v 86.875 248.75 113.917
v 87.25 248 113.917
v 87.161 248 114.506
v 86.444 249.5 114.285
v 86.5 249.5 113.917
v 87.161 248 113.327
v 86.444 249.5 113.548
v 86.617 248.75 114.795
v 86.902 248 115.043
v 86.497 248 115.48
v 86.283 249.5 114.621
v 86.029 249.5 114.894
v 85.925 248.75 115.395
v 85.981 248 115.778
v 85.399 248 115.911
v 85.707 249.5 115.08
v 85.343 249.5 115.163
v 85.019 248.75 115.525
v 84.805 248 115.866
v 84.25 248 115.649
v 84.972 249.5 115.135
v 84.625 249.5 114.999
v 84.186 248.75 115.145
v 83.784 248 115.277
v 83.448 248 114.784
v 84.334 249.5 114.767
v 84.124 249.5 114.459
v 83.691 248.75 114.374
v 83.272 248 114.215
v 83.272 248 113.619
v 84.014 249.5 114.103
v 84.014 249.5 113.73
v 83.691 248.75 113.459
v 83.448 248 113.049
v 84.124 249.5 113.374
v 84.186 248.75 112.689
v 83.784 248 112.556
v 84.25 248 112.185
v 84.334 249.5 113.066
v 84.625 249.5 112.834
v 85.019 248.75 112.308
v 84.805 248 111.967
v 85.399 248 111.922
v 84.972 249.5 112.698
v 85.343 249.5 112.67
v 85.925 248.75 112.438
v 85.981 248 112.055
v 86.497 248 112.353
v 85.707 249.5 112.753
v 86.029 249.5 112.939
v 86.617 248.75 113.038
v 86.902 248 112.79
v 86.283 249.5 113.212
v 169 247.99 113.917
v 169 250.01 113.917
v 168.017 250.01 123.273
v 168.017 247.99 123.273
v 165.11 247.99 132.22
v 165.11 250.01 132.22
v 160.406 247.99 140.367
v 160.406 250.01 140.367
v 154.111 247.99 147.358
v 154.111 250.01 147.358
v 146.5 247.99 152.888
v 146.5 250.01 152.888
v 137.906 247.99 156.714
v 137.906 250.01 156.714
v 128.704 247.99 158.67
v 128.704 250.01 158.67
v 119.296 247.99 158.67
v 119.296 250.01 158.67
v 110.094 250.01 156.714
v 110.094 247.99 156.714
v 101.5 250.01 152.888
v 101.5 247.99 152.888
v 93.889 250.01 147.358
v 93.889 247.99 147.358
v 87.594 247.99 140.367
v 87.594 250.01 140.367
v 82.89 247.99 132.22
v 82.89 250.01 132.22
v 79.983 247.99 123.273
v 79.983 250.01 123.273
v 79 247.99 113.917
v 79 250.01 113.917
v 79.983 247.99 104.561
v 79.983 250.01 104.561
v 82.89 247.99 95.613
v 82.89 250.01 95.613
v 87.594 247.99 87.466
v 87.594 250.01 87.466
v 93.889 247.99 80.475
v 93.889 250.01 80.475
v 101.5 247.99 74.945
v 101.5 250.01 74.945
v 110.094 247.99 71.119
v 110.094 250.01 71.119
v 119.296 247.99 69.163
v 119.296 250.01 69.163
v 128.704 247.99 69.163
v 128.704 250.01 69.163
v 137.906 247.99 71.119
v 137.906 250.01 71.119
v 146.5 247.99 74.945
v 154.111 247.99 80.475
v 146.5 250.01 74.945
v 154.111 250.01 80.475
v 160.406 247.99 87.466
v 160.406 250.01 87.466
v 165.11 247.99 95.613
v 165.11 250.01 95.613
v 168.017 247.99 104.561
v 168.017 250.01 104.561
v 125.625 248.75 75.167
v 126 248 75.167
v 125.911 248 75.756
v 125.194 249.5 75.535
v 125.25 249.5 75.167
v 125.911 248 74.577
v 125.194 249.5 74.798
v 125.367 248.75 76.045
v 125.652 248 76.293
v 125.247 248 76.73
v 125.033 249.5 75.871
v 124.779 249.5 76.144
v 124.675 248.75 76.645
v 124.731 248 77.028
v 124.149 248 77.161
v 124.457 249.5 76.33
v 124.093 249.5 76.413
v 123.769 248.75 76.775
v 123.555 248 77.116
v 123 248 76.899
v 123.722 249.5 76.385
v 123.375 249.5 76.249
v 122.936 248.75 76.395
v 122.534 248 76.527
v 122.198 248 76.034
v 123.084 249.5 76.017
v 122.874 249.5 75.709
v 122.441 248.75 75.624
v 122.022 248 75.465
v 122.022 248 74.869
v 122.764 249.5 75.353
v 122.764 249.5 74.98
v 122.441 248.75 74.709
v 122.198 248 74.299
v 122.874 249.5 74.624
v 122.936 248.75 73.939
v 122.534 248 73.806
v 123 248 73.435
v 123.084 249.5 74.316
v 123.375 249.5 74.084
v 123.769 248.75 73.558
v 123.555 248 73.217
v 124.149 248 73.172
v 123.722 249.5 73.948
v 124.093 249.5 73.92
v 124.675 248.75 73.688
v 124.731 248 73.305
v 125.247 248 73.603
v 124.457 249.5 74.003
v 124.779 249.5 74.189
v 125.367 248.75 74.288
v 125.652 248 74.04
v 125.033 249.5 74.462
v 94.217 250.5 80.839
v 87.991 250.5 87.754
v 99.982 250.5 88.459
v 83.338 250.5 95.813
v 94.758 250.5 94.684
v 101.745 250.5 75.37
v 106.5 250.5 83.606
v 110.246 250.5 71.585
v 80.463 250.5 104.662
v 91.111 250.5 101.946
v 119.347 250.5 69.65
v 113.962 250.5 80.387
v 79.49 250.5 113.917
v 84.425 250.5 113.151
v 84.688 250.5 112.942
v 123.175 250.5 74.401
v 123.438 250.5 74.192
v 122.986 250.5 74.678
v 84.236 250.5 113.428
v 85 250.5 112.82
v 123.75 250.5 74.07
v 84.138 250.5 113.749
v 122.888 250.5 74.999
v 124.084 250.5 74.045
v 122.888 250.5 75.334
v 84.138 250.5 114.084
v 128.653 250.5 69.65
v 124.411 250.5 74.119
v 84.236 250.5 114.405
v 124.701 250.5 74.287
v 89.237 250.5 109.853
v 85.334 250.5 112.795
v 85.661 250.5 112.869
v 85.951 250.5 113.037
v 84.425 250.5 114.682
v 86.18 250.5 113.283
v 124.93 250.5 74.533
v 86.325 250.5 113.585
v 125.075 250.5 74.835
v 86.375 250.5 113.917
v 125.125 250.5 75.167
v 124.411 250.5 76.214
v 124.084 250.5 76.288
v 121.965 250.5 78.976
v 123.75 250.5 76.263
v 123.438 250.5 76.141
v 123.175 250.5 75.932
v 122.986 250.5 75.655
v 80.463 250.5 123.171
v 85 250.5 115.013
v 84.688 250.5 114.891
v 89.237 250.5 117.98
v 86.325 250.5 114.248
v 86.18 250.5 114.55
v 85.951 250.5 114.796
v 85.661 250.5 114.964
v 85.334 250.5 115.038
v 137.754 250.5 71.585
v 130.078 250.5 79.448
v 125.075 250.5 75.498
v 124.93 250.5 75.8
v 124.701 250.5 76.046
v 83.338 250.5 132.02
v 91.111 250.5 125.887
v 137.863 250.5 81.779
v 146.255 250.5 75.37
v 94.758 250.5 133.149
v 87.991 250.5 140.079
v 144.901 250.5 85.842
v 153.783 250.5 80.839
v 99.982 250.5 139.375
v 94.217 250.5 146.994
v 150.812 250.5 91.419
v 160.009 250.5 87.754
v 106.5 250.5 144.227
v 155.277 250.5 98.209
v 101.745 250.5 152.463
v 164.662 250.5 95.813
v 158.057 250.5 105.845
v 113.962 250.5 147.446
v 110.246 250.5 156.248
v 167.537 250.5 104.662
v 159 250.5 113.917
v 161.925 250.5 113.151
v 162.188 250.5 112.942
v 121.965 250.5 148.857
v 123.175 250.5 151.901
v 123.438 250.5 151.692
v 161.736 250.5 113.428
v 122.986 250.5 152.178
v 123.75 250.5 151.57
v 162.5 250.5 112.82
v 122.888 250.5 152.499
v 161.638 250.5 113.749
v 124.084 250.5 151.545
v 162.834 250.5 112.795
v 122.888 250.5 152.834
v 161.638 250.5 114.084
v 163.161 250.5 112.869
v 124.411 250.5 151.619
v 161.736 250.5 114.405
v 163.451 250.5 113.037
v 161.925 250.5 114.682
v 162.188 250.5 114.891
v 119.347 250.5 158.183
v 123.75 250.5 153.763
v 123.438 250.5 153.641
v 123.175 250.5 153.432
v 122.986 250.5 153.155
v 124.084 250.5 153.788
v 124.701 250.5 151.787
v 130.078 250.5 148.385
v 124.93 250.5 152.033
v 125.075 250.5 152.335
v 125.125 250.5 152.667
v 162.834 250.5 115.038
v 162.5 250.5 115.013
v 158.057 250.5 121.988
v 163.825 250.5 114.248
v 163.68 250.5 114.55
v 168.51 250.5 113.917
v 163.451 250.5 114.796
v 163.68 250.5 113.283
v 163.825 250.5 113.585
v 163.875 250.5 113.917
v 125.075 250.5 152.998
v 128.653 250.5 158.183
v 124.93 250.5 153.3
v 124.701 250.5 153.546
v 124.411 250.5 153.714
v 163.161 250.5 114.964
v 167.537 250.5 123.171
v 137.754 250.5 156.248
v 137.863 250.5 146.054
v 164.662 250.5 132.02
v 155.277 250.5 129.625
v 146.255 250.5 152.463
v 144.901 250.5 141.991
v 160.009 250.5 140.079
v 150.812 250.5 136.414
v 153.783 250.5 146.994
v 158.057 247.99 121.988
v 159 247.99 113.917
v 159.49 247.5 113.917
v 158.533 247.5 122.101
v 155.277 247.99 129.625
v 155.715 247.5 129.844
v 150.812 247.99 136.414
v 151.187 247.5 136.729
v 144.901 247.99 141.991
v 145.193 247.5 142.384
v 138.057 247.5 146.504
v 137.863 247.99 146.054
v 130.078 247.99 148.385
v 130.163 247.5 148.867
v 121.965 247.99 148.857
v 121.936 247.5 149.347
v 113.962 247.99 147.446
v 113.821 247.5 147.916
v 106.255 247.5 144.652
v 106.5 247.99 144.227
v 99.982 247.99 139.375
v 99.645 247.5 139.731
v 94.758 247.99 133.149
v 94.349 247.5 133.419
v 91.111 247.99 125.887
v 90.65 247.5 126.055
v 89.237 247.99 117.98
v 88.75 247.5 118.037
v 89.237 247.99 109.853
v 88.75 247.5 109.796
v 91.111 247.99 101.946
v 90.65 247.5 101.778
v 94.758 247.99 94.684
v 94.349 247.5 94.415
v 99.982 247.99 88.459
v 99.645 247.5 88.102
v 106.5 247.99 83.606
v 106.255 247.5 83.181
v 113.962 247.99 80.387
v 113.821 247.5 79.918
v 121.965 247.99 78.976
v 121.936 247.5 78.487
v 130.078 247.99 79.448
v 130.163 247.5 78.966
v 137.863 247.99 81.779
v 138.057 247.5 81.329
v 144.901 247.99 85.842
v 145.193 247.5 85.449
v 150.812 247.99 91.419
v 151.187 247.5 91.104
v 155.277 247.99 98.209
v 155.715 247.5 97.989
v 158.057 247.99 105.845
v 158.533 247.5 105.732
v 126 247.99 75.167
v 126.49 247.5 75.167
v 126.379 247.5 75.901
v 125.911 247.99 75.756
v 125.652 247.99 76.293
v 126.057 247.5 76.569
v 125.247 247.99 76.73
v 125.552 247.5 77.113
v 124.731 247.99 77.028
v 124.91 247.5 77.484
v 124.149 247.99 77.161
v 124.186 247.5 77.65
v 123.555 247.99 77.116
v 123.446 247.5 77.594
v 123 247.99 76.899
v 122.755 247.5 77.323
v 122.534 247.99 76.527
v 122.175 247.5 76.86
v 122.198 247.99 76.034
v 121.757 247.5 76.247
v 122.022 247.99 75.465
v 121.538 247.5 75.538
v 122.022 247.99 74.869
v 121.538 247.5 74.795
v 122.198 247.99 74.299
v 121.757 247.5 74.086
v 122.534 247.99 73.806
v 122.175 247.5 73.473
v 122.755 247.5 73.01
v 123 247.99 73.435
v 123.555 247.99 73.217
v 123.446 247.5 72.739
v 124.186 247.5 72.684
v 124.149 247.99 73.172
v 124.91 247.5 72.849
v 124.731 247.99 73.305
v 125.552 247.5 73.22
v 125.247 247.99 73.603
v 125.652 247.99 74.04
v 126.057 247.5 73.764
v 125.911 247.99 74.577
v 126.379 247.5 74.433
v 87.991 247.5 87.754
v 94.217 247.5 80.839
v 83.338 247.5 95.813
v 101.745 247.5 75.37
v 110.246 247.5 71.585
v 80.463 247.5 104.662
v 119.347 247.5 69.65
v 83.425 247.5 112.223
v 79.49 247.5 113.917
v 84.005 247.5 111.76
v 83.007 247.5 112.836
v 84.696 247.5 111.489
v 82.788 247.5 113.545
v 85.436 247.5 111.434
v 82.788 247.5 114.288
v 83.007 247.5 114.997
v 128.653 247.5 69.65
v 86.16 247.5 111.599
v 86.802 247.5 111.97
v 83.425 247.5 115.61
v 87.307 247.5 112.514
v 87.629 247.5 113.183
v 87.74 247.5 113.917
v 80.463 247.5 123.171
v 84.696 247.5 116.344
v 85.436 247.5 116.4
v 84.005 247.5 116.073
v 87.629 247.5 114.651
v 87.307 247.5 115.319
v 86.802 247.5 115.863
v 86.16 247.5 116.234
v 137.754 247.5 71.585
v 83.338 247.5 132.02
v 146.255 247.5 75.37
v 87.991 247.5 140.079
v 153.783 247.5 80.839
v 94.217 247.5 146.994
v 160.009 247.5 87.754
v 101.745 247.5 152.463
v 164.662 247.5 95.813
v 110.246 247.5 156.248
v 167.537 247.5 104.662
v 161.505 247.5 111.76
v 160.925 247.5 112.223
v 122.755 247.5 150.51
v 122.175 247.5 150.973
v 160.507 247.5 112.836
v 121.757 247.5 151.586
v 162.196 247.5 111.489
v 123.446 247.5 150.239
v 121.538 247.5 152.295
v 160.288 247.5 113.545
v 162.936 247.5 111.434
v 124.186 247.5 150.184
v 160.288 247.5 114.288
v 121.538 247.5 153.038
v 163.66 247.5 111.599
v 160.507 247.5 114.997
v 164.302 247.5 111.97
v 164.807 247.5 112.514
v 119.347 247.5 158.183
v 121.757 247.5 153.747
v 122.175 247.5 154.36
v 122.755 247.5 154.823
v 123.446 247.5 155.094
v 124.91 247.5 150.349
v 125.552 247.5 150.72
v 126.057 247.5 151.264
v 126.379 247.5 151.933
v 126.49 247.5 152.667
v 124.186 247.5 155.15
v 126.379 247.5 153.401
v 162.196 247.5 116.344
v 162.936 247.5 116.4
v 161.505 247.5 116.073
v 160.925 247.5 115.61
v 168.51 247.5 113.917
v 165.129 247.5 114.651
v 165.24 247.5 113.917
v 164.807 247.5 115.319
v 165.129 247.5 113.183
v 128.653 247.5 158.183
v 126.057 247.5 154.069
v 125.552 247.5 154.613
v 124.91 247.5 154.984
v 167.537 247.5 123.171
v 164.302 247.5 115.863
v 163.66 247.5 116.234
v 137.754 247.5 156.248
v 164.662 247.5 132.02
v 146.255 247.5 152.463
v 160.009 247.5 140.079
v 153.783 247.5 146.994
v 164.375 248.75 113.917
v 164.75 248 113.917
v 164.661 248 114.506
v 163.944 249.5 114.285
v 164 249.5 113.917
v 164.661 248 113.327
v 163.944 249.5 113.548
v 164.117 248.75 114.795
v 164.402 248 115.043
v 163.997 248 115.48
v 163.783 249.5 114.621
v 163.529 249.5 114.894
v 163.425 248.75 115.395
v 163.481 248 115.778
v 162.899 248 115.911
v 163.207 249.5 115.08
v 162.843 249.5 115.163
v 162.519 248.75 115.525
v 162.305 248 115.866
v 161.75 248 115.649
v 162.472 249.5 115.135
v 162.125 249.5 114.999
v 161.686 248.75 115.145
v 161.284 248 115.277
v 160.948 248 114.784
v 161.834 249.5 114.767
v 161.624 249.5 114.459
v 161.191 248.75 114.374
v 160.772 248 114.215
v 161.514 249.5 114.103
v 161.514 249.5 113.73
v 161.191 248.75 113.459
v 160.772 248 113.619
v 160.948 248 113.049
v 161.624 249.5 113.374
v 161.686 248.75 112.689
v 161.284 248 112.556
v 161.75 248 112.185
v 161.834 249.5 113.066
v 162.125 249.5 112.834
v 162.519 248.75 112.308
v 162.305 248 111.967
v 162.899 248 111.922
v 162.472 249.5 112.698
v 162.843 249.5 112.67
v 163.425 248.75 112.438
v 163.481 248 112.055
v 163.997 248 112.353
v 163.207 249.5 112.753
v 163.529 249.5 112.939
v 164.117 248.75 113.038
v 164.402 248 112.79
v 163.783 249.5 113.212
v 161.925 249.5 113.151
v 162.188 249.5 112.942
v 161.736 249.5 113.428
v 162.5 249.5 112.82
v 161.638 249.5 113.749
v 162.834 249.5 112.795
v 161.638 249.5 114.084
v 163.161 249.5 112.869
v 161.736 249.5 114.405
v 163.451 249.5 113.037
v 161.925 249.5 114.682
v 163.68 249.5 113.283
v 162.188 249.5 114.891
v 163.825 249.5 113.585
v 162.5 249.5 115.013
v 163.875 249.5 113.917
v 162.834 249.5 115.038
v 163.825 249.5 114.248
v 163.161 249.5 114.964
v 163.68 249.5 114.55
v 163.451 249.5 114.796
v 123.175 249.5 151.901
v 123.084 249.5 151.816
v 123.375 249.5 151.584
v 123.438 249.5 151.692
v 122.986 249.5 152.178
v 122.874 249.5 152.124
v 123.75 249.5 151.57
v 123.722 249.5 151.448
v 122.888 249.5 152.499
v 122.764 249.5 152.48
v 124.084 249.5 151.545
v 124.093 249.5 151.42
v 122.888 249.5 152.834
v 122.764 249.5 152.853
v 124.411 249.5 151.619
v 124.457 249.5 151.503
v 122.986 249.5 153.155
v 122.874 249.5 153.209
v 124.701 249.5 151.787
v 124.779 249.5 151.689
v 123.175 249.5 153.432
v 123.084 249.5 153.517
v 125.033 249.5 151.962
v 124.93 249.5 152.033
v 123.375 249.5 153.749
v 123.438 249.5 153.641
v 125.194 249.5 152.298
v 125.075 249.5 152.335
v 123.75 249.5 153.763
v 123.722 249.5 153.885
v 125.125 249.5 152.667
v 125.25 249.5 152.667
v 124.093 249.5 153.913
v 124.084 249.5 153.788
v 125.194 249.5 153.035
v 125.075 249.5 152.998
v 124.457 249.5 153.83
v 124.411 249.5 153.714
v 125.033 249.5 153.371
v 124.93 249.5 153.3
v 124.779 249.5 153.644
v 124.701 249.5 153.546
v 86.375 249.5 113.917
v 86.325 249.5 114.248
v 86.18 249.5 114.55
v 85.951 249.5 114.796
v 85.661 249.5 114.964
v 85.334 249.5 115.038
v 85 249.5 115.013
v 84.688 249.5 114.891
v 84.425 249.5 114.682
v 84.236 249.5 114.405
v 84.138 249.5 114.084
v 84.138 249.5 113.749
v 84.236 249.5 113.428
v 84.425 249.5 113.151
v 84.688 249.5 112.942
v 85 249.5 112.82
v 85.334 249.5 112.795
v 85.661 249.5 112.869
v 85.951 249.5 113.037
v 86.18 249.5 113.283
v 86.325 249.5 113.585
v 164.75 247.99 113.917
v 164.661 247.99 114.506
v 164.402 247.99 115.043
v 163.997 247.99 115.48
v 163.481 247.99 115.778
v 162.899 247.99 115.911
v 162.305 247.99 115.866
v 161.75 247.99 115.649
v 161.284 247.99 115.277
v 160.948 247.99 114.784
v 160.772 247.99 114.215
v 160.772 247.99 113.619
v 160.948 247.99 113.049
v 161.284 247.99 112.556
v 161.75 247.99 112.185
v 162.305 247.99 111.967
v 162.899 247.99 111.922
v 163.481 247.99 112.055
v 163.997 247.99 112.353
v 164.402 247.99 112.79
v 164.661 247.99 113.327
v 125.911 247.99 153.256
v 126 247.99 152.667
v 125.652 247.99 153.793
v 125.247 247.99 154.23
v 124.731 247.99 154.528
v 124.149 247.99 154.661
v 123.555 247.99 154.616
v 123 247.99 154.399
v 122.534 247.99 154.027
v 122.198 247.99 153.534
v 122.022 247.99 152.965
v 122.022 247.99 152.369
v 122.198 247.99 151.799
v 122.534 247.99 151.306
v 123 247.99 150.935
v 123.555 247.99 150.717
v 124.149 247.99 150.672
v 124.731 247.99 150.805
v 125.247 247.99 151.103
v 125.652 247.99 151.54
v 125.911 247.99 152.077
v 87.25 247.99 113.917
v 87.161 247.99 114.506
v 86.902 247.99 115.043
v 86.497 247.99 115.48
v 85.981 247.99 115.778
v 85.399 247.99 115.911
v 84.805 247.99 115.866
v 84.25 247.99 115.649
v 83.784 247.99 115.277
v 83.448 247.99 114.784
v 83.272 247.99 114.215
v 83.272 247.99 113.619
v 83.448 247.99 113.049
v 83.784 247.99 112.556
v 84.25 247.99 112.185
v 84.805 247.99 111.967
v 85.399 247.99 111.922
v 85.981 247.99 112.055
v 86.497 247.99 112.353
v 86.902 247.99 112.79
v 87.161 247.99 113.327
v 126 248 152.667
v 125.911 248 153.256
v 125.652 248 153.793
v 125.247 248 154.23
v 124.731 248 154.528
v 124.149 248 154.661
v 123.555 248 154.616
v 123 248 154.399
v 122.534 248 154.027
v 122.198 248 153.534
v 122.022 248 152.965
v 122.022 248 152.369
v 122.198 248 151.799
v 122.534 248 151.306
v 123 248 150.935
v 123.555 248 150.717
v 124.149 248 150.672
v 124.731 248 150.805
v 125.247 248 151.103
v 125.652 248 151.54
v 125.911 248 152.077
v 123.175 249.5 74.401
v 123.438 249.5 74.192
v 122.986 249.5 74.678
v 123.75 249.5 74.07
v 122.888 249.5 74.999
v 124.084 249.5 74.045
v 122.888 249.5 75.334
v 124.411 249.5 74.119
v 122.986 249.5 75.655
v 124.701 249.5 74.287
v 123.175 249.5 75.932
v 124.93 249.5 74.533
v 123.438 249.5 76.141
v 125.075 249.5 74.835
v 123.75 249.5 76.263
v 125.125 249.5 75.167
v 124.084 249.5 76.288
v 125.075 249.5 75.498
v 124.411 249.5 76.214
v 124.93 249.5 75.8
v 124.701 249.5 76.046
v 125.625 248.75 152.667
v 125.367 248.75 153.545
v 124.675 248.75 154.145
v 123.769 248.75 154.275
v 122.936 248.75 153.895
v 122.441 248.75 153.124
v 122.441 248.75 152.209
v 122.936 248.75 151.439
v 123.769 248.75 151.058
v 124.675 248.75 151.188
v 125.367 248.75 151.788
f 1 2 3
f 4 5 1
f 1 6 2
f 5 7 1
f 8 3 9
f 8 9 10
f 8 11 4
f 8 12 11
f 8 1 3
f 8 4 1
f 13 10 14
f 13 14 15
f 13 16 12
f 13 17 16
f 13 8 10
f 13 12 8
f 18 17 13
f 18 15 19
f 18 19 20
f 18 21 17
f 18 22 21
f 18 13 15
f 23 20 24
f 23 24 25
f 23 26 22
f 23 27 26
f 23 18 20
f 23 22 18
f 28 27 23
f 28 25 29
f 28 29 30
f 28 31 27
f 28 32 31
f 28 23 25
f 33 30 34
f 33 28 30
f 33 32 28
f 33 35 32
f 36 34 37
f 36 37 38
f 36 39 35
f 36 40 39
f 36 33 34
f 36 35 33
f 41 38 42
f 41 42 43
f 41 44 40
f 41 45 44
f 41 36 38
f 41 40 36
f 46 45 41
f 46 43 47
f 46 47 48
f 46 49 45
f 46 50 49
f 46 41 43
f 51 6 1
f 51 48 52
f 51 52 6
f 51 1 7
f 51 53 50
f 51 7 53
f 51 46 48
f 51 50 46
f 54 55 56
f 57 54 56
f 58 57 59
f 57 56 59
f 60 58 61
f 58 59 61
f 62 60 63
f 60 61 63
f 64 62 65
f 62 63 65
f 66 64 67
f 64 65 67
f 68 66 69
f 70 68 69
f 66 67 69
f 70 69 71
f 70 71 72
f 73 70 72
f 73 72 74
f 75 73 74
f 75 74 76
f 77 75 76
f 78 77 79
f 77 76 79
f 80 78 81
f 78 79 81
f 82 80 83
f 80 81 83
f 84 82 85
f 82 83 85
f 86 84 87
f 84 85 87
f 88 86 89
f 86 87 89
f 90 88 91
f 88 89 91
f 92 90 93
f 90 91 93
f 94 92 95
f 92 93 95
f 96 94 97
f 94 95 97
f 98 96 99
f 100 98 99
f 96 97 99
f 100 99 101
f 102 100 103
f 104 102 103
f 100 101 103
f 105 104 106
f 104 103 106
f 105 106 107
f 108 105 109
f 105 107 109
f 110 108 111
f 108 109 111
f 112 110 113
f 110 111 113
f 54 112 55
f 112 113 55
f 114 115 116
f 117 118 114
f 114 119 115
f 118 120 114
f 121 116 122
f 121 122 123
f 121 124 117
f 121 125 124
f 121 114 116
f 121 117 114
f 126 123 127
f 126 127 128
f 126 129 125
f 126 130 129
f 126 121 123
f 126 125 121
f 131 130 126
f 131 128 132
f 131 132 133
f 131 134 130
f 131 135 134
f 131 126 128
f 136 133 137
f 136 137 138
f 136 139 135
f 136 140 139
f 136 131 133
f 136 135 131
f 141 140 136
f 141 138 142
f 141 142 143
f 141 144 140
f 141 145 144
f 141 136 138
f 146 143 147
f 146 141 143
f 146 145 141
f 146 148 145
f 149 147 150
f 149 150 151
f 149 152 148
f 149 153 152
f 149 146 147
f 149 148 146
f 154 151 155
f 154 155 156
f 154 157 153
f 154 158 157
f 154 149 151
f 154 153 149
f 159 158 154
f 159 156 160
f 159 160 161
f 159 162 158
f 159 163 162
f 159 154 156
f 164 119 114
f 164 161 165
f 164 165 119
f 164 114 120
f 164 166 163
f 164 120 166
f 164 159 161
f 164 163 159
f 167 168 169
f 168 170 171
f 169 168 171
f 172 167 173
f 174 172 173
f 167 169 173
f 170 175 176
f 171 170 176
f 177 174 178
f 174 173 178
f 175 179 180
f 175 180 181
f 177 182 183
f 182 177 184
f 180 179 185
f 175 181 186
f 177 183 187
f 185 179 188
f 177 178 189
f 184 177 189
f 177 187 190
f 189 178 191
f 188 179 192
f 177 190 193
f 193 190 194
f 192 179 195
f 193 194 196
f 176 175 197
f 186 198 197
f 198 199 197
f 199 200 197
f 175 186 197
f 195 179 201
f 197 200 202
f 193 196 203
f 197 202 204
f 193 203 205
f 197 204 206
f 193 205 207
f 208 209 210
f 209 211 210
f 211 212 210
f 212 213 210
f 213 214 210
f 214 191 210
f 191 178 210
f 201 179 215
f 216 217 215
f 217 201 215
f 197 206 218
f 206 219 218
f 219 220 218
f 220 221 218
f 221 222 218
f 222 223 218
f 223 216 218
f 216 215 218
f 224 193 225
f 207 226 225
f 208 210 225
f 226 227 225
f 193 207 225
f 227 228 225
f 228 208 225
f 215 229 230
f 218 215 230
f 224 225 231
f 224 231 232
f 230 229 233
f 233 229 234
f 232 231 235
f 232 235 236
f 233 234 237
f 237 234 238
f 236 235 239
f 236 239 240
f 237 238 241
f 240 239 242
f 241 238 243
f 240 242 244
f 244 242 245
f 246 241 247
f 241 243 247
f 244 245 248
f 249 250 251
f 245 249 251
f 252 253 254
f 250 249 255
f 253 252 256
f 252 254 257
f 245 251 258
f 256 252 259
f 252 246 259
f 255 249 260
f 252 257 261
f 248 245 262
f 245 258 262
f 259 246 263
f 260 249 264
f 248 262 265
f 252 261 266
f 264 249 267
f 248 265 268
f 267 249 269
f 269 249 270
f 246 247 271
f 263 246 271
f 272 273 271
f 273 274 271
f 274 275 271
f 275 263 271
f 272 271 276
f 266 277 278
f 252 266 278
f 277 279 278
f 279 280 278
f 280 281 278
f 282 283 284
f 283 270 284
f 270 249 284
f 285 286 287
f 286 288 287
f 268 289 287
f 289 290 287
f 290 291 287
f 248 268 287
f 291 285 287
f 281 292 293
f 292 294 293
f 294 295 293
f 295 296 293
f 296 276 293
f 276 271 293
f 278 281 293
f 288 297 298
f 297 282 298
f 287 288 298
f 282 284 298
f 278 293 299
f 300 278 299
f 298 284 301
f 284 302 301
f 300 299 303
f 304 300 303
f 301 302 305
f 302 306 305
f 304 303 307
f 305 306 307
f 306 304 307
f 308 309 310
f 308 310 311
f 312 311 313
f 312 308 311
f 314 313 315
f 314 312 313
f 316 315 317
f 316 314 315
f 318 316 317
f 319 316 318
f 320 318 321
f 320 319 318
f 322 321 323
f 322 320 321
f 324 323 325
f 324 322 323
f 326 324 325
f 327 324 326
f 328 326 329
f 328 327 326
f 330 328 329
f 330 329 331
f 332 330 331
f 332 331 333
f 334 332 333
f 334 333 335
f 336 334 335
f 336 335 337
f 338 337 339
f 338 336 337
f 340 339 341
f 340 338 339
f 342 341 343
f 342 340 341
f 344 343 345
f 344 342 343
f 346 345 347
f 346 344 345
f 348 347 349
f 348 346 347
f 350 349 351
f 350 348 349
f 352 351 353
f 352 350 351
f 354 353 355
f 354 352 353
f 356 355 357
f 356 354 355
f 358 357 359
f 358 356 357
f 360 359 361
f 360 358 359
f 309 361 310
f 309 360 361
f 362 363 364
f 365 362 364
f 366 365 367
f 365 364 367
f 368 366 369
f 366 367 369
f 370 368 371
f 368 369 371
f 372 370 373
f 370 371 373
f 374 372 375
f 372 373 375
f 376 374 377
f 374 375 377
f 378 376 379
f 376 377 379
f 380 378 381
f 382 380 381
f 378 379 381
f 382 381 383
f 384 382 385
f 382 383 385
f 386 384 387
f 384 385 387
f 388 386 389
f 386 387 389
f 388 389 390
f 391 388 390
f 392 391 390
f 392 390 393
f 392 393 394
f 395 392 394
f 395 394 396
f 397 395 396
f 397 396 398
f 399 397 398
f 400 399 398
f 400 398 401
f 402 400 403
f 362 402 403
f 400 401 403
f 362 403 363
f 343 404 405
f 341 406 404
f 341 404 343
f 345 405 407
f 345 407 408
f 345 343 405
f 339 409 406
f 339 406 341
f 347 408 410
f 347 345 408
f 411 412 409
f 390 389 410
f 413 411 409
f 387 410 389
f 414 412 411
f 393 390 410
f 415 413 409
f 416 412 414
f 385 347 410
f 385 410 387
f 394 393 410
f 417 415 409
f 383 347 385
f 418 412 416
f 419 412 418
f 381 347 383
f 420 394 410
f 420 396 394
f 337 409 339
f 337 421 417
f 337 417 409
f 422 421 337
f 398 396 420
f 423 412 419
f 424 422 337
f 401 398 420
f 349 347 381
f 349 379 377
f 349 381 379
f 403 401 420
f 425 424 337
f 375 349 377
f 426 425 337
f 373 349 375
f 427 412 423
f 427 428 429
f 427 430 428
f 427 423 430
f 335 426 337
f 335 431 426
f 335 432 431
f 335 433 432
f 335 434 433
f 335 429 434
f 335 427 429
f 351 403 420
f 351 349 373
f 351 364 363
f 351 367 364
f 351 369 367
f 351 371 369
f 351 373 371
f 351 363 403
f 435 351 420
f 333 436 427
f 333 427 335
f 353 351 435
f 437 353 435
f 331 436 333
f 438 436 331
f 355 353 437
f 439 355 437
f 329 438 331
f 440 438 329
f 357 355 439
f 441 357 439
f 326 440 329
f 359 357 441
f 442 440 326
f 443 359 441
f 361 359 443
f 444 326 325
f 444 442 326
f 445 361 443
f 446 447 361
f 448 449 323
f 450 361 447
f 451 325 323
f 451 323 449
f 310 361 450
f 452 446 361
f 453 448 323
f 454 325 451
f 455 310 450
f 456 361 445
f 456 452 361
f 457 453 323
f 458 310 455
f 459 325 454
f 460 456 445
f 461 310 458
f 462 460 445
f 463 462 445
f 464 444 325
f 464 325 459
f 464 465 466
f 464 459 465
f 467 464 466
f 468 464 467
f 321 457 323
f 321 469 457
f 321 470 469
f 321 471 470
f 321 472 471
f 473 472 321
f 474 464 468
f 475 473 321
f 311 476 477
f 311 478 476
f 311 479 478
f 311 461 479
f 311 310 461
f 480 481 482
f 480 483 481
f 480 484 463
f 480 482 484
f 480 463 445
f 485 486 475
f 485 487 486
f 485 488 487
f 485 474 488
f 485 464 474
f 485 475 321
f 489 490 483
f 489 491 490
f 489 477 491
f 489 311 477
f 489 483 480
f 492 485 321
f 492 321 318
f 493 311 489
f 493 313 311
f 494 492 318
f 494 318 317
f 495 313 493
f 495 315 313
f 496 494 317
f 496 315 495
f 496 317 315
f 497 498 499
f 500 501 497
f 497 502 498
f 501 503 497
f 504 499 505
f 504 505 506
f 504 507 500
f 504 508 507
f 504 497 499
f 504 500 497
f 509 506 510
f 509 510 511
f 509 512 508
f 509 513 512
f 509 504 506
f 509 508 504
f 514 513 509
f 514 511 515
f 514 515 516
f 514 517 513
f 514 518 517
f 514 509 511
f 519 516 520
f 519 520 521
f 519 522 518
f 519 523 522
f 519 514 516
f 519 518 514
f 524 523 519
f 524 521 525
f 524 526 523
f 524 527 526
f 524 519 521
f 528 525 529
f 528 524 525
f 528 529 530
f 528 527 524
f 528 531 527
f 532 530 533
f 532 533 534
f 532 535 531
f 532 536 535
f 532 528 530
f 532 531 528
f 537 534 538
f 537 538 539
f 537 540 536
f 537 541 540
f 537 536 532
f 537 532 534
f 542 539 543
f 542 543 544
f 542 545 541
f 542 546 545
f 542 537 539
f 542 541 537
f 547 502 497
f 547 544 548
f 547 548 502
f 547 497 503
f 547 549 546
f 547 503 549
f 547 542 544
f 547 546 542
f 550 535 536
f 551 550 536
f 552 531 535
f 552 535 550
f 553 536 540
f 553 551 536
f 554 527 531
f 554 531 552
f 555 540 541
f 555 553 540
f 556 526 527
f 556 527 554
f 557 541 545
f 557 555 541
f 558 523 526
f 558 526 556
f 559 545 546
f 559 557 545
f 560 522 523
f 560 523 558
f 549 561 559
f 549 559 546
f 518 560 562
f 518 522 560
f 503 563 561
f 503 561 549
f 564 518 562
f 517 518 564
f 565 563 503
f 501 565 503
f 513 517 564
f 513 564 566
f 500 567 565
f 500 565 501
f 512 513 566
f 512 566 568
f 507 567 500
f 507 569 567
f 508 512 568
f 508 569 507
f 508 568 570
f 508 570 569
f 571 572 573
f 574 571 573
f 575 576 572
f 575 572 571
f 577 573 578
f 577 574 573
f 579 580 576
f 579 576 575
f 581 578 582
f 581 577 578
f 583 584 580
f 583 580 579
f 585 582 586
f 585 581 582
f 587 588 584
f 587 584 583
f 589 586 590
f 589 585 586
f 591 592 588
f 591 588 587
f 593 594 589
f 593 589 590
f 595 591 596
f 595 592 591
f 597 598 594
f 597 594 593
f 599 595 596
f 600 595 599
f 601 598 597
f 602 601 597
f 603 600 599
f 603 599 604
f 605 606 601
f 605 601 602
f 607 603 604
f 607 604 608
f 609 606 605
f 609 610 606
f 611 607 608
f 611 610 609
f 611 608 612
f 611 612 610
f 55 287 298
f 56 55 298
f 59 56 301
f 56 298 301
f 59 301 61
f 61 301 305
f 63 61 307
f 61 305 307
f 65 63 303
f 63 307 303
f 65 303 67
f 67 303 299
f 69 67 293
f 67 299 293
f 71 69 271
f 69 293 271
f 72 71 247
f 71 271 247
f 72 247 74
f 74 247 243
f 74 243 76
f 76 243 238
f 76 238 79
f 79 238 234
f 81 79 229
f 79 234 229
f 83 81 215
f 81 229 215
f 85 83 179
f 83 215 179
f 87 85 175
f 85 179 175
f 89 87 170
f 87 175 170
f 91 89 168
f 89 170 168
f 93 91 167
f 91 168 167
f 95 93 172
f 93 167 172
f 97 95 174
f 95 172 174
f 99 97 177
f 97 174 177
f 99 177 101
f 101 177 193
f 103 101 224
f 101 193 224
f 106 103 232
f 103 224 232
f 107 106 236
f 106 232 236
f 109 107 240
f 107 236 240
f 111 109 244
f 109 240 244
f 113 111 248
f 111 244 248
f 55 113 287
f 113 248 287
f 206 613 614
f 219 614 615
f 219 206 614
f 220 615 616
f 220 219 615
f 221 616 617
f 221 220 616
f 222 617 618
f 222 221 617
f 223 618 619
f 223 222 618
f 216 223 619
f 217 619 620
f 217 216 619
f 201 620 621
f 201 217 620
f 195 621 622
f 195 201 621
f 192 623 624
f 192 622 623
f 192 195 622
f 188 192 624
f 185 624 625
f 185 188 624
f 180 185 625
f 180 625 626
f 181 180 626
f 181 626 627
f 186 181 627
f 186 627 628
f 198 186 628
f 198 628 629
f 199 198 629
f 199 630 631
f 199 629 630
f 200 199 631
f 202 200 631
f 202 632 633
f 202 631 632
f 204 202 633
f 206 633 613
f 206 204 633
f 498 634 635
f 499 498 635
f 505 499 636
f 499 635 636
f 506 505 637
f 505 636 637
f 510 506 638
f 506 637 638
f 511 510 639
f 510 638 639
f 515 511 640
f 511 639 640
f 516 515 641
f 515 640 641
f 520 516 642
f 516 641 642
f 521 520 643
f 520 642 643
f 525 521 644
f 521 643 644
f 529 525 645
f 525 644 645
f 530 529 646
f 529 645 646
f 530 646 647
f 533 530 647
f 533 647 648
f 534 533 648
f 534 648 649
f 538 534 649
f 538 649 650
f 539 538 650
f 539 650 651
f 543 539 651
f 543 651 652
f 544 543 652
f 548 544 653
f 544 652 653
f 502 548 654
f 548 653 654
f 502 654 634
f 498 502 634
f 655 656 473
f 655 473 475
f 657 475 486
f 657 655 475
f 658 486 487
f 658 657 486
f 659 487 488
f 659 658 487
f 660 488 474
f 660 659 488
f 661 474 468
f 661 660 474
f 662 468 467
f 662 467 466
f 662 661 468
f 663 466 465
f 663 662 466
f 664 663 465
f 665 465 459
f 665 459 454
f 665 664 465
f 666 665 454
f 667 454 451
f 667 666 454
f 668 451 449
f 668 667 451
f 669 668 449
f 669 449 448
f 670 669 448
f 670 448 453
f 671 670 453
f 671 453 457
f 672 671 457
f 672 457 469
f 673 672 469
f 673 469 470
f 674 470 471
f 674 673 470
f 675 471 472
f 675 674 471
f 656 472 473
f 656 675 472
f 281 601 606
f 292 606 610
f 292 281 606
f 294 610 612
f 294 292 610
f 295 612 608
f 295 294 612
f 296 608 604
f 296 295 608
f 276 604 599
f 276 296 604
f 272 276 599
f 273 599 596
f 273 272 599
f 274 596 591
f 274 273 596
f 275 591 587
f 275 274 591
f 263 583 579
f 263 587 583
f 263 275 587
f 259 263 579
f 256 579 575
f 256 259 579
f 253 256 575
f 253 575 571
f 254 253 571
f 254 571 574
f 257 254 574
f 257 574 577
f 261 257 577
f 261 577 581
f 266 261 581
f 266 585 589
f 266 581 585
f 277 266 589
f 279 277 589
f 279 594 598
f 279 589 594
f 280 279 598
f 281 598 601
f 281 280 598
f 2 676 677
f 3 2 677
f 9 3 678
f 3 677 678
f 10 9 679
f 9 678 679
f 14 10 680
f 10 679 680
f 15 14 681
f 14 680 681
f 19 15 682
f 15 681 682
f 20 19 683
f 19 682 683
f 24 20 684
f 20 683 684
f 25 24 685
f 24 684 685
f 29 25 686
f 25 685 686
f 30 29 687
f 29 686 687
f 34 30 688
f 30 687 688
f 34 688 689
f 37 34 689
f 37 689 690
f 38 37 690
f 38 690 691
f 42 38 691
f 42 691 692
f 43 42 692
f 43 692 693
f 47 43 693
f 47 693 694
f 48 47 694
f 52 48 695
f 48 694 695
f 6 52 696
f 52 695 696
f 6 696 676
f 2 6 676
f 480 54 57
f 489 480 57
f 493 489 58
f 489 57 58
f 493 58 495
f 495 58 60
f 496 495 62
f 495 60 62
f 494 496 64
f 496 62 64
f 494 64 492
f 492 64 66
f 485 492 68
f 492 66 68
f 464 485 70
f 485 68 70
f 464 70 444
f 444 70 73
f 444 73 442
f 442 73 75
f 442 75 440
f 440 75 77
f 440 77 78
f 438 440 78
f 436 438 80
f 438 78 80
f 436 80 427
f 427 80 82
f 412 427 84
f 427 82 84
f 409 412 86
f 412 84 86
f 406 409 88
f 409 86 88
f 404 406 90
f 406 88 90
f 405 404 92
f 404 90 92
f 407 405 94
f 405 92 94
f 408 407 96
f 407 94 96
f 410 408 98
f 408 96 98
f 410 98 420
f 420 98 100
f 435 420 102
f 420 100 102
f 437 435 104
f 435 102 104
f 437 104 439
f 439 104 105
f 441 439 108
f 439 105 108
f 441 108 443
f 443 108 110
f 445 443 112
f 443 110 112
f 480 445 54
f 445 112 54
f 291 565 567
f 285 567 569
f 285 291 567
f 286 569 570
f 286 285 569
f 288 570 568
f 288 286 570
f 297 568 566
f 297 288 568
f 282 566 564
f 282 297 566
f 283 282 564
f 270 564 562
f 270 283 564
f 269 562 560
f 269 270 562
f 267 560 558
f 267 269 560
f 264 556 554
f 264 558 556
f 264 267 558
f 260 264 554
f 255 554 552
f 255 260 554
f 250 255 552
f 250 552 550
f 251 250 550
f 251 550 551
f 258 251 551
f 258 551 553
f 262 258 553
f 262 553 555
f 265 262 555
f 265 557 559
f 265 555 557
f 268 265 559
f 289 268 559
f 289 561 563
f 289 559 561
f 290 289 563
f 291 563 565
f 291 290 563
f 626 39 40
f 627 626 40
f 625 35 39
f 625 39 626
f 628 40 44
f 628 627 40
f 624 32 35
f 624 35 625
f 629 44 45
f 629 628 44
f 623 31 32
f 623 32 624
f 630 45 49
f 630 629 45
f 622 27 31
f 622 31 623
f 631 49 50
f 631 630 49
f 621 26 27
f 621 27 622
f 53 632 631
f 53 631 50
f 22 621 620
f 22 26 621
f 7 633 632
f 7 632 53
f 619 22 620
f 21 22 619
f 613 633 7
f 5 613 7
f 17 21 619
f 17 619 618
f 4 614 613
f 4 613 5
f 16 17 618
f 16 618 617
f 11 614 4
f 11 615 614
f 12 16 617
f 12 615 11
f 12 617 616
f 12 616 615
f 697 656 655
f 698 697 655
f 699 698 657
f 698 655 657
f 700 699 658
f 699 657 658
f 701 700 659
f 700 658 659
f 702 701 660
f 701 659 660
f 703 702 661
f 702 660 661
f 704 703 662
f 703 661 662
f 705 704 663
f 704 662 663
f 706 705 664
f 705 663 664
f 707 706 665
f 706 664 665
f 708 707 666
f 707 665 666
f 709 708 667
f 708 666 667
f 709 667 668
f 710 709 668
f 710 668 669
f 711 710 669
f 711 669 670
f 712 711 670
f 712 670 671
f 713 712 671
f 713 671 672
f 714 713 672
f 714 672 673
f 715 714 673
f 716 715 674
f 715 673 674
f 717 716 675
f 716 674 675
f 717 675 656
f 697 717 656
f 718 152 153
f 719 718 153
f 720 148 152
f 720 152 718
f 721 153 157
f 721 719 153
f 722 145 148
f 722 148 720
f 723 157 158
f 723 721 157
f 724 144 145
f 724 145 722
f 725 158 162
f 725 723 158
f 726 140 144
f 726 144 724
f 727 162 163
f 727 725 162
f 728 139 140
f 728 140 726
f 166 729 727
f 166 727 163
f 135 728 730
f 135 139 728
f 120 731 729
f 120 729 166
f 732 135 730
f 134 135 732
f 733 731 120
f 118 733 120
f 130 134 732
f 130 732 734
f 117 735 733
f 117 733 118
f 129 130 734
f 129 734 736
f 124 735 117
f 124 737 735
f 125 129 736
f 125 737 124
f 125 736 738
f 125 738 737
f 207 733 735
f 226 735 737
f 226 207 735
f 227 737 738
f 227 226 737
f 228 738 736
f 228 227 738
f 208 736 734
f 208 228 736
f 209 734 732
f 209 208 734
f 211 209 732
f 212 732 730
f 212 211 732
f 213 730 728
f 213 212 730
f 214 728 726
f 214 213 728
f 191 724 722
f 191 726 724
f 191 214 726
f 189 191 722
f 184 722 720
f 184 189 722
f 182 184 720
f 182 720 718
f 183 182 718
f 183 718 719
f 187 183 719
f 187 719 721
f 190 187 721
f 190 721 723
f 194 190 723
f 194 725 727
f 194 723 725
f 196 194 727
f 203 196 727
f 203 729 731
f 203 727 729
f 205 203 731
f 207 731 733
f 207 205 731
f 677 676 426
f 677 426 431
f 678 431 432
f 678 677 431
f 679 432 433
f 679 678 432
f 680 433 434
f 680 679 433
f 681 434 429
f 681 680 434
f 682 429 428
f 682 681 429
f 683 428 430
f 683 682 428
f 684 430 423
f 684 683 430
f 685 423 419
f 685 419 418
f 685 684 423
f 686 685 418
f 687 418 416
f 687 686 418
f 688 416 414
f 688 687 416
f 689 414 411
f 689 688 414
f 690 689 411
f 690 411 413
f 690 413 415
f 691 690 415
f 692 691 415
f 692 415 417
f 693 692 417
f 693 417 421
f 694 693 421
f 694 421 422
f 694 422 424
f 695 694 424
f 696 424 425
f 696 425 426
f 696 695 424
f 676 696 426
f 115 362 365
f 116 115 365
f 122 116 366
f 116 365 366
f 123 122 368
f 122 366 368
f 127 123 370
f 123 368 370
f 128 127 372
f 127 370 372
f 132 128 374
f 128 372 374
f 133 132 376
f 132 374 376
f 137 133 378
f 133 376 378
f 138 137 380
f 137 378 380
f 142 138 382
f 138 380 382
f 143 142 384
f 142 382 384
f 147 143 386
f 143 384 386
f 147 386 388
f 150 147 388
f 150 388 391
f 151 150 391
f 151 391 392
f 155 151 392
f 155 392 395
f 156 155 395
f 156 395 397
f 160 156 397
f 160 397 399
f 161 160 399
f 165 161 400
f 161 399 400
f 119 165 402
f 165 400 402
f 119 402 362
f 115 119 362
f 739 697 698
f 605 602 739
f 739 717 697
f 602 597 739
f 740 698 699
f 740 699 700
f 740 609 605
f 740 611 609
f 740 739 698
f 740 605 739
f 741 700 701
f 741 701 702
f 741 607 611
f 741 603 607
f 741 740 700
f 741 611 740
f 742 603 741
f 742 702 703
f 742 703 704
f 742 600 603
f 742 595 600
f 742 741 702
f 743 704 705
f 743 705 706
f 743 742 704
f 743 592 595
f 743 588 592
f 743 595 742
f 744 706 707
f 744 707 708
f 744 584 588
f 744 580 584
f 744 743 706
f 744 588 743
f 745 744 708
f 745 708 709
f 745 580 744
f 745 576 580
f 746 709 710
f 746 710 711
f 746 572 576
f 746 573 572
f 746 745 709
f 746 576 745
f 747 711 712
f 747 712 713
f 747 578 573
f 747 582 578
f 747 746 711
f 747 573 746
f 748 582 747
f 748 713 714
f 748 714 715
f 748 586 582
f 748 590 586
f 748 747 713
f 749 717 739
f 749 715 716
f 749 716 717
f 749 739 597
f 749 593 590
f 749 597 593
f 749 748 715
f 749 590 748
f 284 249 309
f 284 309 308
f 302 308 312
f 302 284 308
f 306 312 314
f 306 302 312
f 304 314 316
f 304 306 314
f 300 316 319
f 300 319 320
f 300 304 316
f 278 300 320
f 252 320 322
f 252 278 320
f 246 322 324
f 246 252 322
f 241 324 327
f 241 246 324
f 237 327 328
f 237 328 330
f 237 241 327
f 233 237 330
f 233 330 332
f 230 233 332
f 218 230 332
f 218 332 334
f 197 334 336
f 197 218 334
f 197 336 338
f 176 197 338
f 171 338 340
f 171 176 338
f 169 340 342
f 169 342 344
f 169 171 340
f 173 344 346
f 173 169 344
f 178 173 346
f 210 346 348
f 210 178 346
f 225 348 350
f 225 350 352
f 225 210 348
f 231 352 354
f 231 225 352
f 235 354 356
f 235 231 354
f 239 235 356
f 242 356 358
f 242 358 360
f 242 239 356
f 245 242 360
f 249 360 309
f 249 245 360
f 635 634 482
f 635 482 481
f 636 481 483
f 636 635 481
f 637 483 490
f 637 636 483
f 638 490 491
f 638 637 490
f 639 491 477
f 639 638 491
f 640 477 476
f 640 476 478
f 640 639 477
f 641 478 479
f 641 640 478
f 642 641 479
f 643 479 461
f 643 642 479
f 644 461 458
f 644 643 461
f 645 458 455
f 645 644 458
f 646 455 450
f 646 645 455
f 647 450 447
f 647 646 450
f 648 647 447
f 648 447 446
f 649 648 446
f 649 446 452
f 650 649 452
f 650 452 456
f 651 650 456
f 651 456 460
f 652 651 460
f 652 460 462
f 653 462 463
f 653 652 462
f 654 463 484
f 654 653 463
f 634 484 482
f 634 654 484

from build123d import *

# Parameters (mm, degrees)
SKETCH058_R        = 45
SKETCH058_R_2      = 35
SKETCH058_R_3      = 1.125
PAD018_DEPTH       = 3
SKETCH059_R        = 2
POCKET040_DEPTH    = 2
CHAMFER010_1_SIZE2 = 0.75
CHAMFER010_1_SIZE  = 1.5
CHAMFER010_2_SIZE2 = 0.75
CHAMFER010_2_SIZE  = 1.5
CHAMFER010_3_SIZE2 = 0.75
CHAMFER010_3_SIZE  = 1.5
CHAMFER010_4_SIZE2 = 0.75
CHAMFER010_4_SIZE  = 1.5
CHAMFER011_SIZE    = 0.49


with BuildPart() as part:
    # Sketch058 (on Face1 of ShapeBinder010) → Pad018 (new body)
    with BuildSketch(Plane(origin=(248, 250.5, 0), x_dir=(1, 0, 0), z_dir=(0, -1, 0))):
        with Locations((-124, 113.916594)):
            Circle(SKETCH058_R)
        with Locations((-124, 113.916594)):
            Circle(SKETCH058_R_2, mode=Mode.SUBTRACT)
        with Locations((-162.75, 113.916594)):
            Circle(SKETCH058_R_3, mode=Mode.SUBTRACT)
        with Locations((-124, 152.666594)):
            Circle(SKETCH058_R_3, mode=Mode.SUBTRACT)
        with Locations((-85.25, 113.916594)):
            Circle(SKETCH058_R_3, mode=Mode.SUBTRACT)
        with Locations((-124, 75.166594)):
            Circle(SKETCH058_R_3, mode=Mode.SUBTRACT)
    extrude(amount=PAD018_DEPTH)

    # Sketch059 (on Face8 of Pad018) → Pocket040 (cut)
    with BuildSketch(Plane(origin=(248, 247.5, 0), x_dir=(1, 0, 0), z_dir=(0, -1, 0))):
        with Locations((-85.25, 113.916594)):
            Circle(SKETCH059_R)
        with Locations((-124, 152.666594)):
            Circle(SKETCH059_R)
        with Locations((-162.75, 113.916594)):
            Circle(SKETCH059_R)
        with Locations((-124, 75.166594)):
            Circle(SKETCH059_R)
    extrude(amount=-POCKET040_DEPTH, mode=Mode.SUBTRACT)

    # Chamfer010 1
    chamfer010_1_edges = [part.edges().sort_by_distance(p)[0] for p in [
        (160.75, 249.5, 113.916594),
    ]]
    chamfer010_1_side = part.faces().sort_by_distance((160.75, 248.5, 113.916594))[0]
    chamfer(chamfer010_1_edges, length=CHAMFER010_1_SIZE, length2=CHAMFER010_1_SIZE2, reference=chamfer010_1_side)

    # Chamfer010 2
    chamfer010_2_edges = [part.edges().sort_by_distance(p)[0] for p in [
        (83.25, 249.5, 113.916594),
    ]]
    chamfer010_2_side = part.faces().sort_by_distance((83.25, 248.5, 113.916594))[0]
    chamfer(chamfer010_2_edges, length=CHAMFER010_2_SIZE, length2=CHAMFER010_2_SIZE2, reference=chamfer010_2_side)

    # Chamfer010 3
    chamfer010_3_edges = [part.edges().sort_by_distance(p)[0] for p in [
        (122, 249.5, 152.666594),
    ]]
    chamfer010_3_side = part.faces().sort_by_distance((122, 248.5, 152.666594))[0]
    chamfer(chamfer010_3_edges, length=CHAMFER010_3_SIZE, length2=CHAMFER010_3_SIZE2, reference=chamfer010_3_side)

    # Chamfer010 4
    chamfer010_4_edges = [part.edges().sort_by_distance(p)[0] for p in [
        (122, 249.5, 75.166594),
    ]]
    chamfer010_4_side = part.faces().sort_by_distance((122, 248.5, 75.166594))[0]
    chamfer(chamfer010_4_edges, length=CHAMFER010_4_SIZE, length2=CHAMFER010_4_SIZE2, reference=chamfer010_4_side)

    # Chamfer011
    chamfer011_edges = [part.edges().sort_by_distance(p)[0] for p in [
        (79, 250.5, 113.916594),
        (79, 247.5, 113.916594),
        (122, 247.5, 152.666594),
        (83.25, 247.5, 113.916594),
        (122, 247.5, 75.166594),
        (89, 247.5, 113.916594),
        (160.75, 247.5, 113.916594),
    ]]
    chamfer(chamfer011_edges, length=CHAMFER011_SIZE)


solid = part.part
